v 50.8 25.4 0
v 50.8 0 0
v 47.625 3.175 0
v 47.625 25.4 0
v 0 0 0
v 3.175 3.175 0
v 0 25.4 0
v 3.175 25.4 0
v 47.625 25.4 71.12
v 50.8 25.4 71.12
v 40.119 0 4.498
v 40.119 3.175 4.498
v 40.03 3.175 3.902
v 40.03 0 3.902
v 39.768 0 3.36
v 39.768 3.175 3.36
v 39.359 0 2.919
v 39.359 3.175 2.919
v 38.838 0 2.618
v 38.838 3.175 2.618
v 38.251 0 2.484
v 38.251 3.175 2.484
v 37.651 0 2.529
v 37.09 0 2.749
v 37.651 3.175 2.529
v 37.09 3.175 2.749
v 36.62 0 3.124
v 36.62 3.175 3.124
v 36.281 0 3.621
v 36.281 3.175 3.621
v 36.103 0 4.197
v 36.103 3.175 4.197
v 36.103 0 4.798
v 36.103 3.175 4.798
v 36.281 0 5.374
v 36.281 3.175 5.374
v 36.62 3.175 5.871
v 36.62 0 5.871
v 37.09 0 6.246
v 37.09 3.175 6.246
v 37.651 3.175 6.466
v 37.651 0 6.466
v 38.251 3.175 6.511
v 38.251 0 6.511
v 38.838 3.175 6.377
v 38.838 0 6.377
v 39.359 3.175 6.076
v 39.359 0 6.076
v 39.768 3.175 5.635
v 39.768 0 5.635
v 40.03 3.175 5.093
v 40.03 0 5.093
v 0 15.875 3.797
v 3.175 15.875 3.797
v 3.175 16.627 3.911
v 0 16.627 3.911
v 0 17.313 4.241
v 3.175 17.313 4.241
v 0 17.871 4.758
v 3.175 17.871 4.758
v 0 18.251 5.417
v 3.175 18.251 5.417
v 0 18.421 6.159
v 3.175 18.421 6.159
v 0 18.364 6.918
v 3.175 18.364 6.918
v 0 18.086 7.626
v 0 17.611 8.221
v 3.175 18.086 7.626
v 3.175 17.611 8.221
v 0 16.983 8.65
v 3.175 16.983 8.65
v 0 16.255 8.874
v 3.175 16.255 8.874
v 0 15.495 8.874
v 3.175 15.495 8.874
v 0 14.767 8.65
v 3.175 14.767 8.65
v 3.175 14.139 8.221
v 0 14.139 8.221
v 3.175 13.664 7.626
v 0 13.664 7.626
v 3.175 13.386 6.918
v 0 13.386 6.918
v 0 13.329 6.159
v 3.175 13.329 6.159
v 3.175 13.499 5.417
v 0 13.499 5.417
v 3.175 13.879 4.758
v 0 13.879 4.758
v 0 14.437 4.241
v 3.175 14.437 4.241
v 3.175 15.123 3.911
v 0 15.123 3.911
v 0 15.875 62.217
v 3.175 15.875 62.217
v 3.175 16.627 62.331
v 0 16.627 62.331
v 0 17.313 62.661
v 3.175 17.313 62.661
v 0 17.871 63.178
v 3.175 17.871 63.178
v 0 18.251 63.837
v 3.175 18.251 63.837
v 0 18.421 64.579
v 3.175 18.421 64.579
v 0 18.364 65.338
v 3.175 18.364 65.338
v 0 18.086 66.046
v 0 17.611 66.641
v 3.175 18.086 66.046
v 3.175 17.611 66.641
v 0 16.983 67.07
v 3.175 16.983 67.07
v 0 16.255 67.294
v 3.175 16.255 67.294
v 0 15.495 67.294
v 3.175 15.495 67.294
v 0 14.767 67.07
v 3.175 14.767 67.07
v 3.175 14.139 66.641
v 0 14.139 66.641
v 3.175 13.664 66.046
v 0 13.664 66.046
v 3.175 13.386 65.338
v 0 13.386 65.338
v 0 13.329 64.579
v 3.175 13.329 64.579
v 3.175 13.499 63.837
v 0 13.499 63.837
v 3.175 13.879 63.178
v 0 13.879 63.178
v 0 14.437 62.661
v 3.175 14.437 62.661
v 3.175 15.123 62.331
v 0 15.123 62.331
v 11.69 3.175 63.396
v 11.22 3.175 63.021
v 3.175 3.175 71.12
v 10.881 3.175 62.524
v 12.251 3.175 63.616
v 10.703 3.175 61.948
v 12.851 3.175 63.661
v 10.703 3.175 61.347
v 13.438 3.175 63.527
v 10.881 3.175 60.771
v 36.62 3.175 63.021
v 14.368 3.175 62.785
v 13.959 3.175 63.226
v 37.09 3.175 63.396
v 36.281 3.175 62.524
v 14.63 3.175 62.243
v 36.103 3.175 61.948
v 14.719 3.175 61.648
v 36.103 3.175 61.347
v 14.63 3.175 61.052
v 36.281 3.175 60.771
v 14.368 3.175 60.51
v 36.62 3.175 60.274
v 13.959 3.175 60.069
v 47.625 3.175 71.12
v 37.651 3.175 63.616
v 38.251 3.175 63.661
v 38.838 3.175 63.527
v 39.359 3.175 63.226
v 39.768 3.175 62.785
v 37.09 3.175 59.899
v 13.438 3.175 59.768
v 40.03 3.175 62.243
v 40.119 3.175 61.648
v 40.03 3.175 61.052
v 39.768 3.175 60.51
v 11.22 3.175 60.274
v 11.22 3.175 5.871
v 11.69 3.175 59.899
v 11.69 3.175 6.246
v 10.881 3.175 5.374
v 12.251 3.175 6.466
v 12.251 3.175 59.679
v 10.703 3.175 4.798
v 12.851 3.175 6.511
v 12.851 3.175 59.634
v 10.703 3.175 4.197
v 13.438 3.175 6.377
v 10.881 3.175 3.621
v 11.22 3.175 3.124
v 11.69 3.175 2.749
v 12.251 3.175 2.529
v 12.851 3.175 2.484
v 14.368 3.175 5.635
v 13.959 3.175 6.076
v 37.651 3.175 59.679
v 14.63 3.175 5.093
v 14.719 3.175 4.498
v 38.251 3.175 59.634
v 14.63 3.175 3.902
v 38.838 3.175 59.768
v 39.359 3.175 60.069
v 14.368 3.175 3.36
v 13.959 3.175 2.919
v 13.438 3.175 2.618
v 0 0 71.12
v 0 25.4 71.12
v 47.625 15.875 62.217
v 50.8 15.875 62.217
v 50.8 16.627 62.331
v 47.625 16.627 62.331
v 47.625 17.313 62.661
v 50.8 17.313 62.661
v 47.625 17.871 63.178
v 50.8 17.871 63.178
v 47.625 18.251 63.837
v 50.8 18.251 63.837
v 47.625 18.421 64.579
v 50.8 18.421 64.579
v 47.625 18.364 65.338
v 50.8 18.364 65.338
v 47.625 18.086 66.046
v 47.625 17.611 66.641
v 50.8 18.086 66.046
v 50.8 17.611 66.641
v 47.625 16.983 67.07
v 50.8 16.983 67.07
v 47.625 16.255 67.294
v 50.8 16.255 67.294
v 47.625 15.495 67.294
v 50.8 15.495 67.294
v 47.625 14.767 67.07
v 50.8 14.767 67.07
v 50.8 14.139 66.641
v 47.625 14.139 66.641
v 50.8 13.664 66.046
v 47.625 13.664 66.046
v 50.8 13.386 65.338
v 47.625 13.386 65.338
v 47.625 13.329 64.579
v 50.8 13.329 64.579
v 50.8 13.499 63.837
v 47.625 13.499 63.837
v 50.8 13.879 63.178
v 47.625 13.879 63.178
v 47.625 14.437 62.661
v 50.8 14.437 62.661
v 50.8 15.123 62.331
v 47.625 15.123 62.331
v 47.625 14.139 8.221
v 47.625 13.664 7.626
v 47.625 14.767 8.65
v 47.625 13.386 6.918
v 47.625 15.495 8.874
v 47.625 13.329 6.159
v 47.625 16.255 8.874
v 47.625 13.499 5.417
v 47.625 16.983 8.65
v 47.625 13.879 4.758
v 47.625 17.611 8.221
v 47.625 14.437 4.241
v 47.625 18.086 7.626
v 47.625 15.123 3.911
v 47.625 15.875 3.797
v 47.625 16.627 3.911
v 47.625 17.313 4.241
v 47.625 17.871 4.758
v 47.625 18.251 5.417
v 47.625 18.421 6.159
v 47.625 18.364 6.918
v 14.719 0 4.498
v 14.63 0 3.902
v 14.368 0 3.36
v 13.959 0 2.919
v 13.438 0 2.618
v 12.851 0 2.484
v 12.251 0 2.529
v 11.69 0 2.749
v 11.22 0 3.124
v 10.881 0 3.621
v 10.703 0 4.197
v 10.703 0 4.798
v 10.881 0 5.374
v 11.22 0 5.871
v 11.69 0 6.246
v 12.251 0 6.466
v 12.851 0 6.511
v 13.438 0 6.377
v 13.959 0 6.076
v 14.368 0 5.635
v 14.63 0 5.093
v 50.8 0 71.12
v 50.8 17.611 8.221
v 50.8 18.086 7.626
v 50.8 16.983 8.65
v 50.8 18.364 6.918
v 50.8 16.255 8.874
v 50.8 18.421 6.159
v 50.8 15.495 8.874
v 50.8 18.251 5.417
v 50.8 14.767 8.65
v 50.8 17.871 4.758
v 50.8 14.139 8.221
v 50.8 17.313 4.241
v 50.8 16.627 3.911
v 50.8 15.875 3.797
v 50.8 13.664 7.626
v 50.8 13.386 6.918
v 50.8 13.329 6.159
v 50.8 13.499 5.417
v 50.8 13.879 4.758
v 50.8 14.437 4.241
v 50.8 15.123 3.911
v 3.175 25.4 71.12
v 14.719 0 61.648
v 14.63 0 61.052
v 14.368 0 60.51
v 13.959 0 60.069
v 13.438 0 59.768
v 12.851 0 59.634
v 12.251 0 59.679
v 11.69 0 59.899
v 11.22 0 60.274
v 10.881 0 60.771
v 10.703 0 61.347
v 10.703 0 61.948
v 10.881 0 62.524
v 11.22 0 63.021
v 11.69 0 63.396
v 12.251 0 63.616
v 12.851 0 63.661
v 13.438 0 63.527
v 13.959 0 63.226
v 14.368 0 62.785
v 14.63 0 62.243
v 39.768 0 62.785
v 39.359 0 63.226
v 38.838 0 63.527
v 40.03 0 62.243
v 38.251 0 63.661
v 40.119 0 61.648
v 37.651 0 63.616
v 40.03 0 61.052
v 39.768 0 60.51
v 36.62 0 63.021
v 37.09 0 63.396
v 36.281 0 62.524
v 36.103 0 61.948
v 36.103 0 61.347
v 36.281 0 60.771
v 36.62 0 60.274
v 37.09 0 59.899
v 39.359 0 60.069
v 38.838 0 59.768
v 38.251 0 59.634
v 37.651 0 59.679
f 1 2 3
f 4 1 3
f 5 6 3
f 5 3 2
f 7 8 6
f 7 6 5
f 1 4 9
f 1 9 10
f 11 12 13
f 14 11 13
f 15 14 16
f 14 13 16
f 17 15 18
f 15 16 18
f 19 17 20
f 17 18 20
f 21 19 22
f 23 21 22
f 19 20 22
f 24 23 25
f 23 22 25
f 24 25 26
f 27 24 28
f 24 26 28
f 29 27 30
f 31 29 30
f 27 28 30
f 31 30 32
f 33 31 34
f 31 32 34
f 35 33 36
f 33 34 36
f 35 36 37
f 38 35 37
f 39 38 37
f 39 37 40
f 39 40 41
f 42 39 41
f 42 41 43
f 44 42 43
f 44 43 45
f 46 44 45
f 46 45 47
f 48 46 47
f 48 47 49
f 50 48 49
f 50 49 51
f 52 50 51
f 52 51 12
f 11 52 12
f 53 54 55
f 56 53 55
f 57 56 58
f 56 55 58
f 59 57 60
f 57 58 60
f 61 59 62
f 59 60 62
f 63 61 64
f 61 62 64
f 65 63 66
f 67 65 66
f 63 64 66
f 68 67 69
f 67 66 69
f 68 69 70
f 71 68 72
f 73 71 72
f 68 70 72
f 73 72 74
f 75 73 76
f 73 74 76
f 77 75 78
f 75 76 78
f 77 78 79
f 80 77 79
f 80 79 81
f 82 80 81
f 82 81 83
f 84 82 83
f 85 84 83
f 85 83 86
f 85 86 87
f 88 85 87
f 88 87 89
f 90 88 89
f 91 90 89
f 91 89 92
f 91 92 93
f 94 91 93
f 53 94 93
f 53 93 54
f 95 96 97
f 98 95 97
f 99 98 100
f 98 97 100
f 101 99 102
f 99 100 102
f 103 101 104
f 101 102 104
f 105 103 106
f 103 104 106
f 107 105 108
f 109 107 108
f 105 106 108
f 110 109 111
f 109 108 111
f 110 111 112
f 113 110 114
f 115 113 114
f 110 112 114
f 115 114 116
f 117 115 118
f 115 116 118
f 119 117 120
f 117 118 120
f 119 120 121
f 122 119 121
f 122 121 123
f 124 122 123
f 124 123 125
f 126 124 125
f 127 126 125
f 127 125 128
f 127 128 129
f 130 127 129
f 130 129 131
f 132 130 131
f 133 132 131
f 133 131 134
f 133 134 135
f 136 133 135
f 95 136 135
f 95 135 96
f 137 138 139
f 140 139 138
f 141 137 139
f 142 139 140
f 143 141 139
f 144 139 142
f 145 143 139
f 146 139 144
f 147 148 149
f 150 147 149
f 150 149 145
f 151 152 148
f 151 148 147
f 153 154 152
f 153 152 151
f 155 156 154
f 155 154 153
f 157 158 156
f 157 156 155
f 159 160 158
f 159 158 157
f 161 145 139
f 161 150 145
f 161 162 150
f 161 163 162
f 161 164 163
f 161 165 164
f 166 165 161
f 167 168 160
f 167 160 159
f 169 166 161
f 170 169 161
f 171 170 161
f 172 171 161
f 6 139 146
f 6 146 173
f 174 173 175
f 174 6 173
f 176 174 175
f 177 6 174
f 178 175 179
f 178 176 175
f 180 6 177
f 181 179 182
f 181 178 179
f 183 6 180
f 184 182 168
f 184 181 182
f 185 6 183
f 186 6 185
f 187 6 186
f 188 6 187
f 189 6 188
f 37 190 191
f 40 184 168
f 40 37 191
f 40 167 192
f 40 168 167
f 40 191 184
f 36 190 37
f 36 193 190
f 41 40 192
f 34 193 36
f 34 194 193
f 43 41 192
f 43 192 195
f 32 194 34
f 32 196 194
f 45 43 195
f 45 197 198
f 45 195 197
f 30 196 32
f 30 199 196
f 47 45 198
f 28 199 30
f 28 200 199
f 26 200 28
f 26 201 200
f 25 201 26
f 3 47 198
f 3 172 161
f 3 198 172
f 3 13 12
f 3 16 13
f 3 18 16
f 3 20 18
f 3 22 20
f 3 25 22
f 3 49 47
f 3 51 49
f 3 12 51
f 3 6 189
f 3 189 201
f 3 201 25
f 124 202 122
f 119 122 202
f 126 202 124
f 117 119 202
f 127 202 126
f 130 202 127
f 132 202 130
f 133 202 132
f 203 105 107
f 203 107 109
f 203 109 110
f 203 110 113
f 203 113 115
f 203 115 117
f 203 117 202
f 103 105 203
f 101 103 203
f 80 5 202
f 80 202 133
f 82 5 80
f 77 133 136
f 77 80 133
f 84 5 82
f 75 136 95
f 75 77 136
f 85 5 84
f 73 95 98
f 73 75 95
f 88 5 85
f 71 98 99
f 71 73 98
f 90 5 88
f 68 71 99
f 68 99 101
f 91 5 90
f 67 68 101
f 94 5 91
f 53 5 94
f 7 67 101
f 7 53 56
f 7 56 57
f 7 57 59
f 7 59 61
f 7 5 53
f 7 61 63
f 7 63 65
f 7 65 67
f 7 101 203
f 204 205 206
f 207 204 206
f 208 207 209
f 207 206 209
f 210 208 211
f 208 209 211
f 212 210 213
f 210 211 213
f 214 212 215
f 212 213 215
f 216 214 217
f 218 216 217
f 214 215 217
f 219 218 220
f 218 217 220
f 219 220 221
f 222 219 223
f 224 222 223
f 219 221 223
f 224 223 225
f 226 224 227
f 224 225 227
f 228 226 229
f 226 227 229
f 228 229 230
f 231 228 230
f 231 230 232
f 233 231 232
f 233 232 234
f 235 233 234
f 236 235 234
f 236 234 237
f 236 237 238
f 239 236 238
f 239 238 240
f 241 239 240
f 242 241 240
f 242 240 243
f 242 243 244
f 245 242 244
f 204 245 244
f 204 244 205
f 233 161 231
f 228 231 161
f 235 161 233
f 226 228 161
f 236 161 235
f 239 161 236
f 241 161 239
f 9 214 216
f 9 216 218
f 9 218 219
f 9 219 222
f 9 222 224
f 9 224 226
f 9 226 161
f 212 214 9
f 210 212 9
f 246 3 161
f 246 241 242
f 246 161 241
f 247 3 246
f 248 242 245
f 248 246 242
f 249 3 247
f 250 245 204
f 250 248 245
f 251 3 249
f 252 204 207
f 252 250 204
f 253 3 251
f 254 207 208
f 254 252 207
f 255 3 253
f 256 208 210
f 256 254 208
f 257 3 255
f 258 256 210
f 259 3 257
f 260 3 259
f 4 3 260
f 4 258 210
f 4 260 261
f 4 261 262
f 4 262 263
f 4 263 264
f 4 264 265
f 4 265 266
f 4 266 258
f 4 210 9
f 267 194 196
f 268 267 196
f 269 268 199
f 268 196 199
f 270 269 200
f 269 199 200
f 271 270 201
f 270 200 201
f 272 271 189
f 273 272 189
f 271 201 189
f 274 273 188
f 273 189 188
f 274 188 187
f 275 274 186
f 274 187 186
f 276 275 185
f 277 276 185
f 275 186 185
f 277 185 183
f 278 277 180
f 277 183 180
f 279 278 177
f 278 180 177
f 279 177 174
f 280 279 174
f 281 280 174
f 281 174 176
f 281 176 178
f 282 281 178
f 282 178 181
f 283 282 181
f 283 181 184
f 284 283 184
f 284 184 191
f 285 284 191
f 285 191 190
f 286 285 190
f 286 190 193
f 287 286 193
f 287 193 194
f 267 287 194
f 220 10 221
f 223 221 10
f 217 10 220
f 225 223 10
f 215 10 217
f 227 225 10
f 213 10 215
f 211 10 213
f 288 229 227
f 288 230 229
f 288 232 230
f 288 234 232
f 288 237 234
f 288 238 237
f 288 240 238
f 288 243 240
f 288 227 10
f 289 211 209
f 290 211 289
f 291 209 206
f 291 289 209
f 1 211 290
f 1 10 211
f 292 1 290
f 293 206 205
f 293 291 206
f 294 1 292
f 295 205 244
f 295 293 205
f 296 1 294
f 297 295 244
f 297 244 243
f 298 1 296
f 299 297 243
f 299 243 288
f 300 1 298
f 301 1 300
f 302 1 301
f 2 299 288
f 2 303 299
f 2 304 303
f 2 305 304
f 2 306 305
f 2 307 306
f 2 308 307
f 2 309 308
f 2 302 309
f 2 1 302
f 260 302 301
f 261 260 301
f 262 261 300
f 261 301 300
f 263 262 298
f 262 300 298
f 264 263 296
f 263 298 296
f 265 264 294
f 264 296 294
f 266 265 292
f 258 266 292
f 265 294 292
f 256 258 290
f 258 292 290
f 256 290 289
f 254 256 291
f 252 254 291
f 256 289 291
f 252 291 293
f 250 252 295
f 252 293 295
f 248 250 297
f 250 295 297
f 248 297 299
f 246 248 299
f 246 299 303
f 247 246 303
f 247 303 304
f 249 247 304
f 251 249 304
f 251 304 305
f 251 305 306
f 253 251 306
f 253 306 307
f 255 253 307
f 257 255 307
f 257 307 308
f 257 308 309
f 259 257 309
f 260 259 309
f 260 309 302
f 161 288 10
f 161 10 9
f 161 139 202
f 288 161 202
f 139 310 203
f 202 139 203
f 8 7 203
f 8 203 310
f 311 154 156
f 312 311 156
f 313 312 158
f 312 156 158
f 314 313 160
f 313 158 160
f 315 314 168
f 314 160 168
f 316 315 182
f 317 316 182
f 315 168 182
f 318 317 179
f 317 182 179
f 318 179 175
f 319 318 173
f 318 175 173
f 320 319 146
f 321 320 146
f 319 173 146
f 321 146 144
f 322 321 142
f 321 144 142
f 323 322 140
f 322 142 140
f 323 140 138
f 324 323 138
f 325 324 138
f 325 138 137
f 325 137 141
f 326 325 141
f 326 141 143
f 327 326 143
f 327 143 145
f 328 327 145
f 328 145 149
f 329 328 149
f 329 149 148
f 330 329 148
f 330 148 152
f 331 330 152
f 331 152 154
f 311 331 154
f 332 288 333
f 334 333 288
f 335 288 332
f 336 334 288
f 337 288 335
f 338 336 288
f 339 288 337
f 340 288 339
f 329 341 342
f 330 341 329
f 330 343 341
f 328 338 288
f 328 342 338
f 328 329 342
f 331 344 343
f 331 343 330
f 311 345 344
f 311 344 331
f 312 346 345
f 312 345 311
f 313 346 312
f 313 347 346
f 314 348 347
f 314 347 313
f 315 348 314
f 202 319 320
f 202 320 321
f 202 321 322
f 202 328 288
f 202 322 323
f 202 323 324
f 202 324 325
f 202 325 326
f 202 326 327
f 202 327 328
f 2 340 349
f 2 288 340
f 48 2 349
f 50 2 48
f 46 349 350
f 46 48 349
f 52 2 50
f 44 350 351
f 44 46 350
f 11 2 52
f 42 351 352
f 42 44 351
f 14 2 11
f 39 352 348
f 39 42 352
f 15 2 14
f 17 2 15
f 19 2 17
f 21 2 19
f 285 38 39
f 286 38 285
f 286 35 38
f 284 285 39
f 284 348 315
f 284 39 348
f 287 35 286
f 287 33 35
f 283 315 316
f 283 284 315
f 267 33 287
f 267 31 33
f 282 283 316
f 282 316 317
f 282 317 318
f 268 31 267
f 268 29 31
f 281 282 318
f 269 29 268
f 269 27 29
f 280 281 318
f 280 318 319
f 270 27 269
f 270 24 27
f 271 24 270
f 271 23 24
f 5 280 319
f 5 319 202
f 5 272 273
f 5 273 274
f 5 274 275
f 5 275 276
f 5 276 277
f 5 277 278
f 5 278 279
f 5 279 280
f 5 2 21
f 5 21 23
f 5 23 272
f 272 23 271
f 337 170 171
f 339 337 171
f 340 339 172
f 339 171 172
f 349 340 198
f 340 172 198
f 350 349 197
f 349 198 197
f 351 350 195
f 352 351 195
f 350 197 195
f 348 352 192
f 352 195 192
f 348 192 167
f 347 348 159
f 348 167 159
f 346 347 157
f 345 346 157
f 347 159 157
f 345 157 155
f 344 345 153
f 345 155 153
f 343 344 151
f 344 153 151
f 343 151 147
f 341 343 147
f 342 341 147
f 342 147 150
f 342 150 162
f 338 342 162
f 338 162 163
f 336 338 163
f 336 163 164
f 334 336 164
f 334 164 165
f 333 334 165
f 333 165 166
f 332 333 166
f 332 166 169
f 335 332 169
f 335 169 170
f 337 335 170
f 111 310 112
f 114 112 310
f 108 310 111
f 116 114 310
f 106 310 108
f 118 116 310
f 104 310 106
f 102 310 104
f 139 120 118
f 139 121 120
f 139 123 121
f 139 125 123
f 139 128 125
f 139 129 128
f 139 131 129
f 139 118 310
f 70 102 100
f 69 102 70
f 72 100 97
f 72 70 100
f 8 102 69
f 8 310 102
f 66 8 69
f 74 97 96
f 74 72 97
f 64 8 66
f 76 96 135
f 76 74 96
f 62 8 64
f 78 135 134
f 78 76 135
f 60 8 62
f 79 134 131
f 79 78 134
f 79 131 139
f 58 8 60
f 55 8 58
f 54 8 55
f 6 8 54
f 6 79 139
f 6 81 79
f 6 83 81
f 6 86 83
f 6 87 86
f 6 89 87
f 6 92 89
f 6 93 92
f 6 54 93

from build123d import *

# Parameters (mm, degrees)
BOSS_EXTRUDE1_DEPTH = 71.12
CUT_EXTRUDE1_REACH  = 5.175
SKETCH2_R           = 2.0193
SKETCH3_R           = 2.5527
CUT_EXTRUDE2_DEPTH  = 51.8


with BuildPart() as part:
    # Sketch1 → Boss-Extrude1 (new body)
    with BuildSketch(Plane.XY):
        Polygon((47.625, 3.175), (47.625, 25.4), (50.8, 25.4), (50.8, 0), (0, 0), (0, 25.4), (3.175, 25.4), (3.175, 3.175), align=None)
    extrude(amount=BOSS_EXTRUDE1_DEPTH)

    # Sketch2 → Cut-Extrude1 (cut, up to next)
    with BuildSketch(Plane(origin=(0, 3.175, 0), x_dir=(1, 0, 0), z_dir=(0, 1, 0)), mode=Mode.PRIVATE) as cut_extrude1_sk1:
        with Locations((38.1, -4.4975)):
            Circle(SKETCH2_R)
    cut_extrude1_tool1 = extrude(cut_extrude1_sk1.sketch, amount=-CUT_EXTRUDE1_REACH, mode=Mode.PRIVATE) & part.part
    add(cut_extrude1_tool1.solids().sort_by_distance((38.1, 3.175, 4.4975))[0], mode=Mode.SUBTRACT)
    # Sketch2 → Cut-Extrude1 (cut, up to next)
    with BuildSketch(Plane(origin=(0, 3.175, 0), x_dir=(1, 0, 0), z_dir=(0, 1, 0)), mode=Mode.PRIVATE) as cut_extrude1_sk2:
        with Locations((38.1, -61.6475)):
            Circle(SKETCH2_R)
    cut_extrude1_tool2 = extrude(cut_extrude1_sk2.sketch, amount=-CUT_EXTRUDE1_REACH, mode=Mode.PRIVATE) & part.part
    add(cut_extrude1_tool2.solids().sort_by_distance((38.1, 3.175, 61.6475))[0], mode=Mode.SUBTRACT)
    # Sketch2 → Cut-Extrude1 (cut, up to next)
    with BuildSketch(Plane(origin=(0, 3.175, 0), x_dir=(1, 0, 0), z_dir=(0, 1, 0)), mode=Mode.PRIVATE) as cut_extrude1_sk3:
        with Locations((12.7, -4.4975)):
            Circle(SKETCH2_R)
    cut_extrude1_tool3 = extrude(cut_extrude1_sk3.sketch, amount=-CUT_EXTRUDE1_REACH, mode=Mode.PRIVATE) & part.part
    add(cut_extrude1_tool3.solids().sort_by_distance((12.7, 3.175, 4.4975))[0], mode=Mode.SUBTRACT)
    # Sketch2 → Cut-Extrude1 (cut, up to next)
    with BuildSketch(Plane(origin=(0, 3.175, 0), x_dir=(1, 0, 0), z_dir=(0, 1, 0)), mode=Mode.PRIVATE) as cut_extrude1_sk4:
        with Locations((12.7, -61.6475)):
            Circle(SKETCH2_R)
    cut_extrude1_tool4 = extrude(cut_extrude1_sk4.sketch, amount=-CUT_EXTRUDE1_REACH, mode=Mode.PRIVATE) & part.part
    add(cut_extrude1_tool4.solids().sort_by_distance((12.7, 3.175, 61.6475))[0], mode=Mode.SUBTRACT)

    # Sketch3 → Cut-Extrude2 (cut, through all)
    with BuildSketch(Plane(origin=(50.8, 0, 0), x_dir=(0, 0, -1), z_dir=(1, 0, 0))):
        with Locations((-6.35, 15.875)):
            Circle(SKETCH3_R)
        with Locations((-64.77, 15.875)):
            Circle(SKETCH3_R)
    extrude(amount=-CUT_EXTRUDE2_DEPTH, mode=Mode.SUBTRACT)


solid = part.part
